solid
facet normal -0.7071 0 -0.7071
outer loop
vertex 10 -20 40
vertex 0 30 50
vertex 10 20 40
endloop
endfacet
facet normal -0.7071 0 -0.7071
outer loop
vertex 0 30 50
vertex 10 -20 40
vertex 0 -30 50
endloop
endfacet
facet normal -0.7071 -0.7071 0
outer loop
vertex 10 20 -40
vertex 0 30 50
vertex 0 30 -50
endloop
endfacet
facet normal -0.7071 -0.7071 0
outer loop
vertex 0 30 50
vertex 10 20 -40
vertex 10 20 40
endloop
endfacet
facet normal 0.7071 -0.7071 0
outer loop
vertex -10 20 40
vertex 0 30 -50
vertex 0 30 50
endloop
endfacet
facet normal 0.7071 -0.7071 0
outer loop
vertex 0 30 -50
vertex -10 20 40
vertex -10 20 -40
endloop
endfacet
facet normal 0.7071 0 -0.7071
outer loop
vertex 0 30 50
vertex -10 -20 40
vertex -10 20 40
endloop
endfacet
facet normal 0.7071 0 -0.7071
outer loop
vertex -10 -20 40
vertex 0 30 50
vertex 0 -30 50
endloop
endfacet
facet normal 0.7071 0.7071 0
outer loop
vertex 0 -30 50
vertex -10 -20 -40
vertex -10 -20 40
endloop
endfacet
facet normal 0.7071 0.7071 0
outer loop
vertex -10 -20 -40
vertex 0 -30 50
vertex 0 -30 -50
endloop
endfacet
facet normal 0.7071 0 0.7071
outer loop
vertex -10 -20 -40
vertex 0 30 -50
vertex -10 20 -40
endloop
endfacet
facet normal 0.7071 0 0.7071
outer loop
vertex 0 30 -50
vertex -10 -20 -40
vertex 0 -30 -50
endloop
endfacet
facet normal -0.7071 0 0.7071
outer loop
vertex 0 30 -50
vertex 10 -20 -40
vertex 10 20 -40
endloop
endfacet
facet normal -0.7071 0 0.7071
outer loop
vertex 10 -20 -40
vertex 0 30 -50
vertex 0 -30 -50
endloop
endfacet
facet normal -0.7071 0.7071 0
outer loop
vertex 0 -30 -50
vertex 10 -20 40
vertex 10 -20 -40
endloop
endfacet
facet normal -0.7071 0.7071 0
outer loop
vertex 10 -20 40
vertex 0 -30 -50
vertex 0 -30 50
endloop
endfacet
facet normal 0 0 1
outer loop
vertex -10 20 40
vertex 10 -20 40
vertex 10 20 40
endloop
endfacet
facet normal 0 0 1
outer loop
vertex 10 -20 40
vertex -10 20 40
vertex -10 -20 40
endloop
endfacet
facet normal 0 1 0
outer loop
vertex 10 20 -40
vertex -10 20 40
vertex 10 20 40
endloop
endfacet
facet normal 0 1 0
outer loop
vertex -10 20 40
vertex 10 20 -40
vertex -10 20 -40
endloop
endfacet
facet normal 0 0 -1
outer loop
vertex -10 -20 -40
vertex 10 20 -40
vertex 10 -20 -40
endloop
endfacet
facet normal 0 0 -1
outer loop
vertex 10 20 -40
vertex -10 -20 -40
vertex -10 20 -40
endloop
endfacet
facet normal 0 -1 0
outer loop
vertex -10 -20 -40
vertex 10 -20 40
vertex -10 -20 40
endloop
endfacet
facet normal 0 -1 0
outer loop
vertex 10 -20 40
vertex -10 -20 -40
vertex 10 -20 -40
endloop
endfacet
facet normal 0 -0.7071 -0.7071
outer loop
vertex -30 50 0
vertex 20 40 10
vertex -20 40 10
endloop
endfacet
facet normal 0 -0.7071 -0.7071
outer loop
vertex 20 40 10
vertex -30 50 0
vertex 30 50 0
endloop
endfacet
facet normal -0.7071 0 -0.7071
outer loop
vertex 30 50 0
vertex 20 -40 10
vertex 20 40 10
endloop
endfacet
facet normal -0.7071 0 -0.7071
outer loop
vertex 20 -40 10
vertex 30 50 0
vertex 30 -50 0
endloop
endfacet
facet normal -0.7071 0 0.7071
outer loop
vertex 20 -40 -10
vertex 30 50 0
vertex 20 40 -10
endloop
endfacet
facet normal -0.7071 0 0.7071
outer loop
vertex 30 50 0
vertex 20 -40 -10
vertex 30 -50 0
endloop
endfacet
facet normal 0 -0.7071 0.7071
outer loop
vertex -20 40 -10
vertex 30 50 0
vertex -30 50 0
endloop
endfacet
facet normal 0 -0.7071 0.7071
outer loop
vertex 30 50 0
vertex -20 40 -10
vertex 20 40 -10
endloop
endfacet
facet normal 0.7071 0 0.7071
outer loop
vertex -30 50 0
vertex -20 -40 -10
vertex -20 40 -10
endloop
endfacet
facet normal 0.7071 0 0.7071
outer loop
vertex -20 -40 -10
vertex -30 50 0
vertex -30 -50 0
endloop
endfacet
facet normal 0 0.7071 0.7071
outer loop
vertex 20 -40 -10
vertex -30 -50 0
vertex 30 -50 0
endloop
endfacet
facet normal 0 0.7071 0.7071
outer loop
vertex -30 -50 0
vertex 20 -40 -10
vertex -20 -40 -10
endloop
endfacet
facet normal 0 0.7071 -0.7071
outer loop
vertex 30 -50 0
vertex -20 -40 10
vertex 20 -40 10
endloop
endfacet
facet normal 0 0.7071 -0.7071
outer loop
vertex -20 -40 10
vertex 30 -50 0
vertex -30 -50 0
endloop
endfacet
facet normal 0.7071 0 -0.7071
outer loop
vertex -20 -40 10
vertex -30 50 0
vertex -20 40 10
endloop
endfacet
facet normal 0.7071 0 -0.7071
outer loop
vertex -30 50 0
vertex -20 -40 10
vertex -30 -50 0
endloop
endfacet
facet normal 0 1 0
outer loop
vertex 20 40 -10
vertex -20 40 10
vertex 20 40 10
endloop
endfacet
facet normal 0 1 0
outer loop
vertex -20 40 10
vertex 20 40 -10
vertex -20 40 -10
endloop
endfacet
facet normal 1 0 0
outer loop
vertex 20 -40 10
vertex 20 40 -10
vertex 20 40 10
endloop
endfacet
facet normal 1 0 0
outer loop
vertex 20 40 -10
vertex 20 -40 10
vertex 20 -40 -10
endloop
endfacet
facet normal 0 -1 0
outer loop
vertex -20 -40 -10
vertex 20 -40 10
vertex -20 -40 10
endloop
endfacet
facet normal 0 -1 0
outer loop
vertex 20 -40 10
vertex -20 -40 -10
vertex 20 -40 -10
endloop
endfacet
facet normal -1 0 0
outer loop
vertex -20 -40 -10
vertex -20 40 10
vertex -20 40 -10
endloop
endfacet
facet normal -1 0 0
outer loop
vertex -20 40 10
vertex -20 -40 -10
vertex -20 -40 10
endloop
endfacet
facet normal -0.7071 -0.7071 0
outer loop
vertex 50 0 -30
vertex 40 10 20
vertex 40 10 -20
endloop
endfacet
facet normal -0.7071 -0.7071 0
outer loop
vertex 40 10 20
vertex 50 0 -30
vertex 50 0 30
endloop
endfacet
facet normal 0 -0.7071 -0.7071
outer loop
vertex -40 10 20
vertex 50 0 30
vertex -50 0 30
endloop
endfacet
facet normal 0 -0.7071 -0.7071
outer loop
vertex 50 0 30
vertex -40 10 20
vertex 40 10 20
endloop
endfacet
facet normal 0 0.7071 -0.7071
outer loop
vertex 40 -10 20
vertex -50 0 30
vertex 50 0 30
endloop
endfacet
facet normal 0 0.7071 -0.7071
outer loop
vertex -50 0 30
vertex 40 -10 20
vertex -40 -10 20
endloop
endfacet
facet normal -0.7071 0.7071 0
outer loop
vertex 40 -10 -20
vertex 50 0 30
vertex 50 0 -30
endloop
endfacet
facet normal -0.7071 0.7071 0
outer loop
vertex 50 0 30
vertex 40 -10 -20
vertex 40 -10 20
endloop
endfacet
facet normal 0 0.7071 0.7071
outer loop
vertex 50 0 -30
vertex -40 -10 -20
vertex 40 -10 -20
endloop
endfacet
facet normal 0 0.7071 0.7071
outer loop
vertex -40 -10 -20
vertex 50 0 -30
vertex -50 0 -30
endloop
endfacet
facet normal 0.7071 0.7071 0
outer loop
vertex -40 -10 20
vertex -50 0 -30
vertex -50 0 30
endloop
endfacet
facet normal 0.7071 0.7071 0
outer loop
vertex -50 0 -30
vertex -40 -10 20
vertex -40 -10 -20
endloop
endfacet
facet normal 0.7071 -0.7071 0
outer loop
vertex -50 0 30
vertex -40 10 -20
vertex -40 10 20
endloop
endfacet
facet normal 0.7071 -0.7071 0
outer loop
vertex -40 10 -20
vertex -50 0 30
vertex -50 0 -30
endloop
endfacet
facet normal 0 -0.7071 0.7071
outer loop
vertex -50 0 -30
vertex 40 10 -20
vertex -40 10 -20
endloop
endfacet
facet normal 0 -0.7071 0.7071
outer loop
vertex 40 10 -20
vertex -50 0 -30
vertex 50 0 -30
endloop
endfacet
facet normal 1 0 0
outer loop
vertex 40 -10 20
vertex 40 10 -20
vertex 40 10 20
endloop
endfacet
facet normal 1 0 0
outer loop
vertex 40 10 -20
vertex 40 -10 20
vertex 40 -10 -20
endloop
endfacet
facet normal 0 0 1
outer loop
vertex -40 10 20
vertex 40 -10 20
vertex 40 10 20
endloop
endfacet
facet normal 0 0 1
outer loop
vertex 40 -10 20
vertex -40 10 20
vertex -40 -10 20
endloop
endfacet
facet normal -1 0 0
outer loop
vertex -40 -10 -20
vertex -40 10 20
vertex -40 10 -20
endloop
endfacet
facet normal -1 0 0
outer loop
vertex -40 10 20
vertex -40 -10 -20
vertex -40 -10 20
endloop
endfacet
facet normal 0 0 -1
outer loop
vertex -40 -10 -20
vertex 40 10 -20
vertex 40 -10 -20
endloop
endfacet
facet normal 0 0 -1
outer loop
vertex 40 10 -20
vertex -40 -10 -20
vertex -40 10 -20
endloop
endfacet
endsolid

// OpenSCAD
// Borromean Rings
//   coords via: http://dmccooey.com/polyhedra/BorromeanRings.html
//
scaling_factor = 10;

vertices = [
  [ 0,  3,  5], [ 0,  3, -5], [ 0, -3,  5], [ 0, -3, -5], // 1
  [ 1,  2,  4], [ 1,  2, -4], [ 1, -2,  4], [ 1, -2, -4],
  [-1,  2,  4], [-1,  2, -4], [-1, -2,  4], [-1, -2, -4],
  [ 3,  5,  0], [ 3, -5,  0], [-3,  5,  0], [-3, -5,  0], // 2
  [ 2,  4,  1], [ 2, -4,  1], [-2,  4,  1], [-2, -4,  1],
  [ 2,  4, -1], [ 2, -4, -1], [-2,  4, -1], [-2, -4, -1],
  [ 5,  0,  3], [-5,  0,  3], [ 5,  0, -3], [-5,  0, -3], // 3
  [ 4,  1,  2], [-4,  1,  2], [ 4,  1, -2], [-4,  1, -2],
  [ 4, -1,  2], [-4, -1,  2], [ 4, -1, -2], [-4, -1, -2]
];

faces = [
  [ 0,  2,  6,  4], [ 0,  4,  5,  1], [ 0,  1,  9,  8], [ 0,  8, 10,  2],
  [ 3,  2, 10, 11], [ 3, 11,  9,  1], [ 3,  1,  5,  7], [ 3,  7,  6,  2],
  [ 4,  6, 10,  8], [ 4,  8,  9,  5], [ 7,  5,  9, 11], [ 7, 11, 10,  6],
  [12, 14, 18, 16], [12, 16, 17, 13], [12, 13, 21, 20], [12, 20, 22, 14],
  [15, 14, 22, 23], [15, 23, 21, 13], [15, 13, 17, 19], [15, 19, 18, 14],
  [16, 18, 22, 20], [16, 20, 21, 17], [19, 17, 21, 23], [19, 23, 22, 18],
  [24, 26, 30, 28], [24, 28, 29, 25], [24, 25, 33, 32], [24, 32, 34, 26],
  [27, 26, 34, 35], [27, 35, 33, 25], [27, 25, 29, 31], [27, 31, 30, 26],
  [28, 30, 34, 32], [28, 32, 33, 29], [31, 29, 33, 35], [31, 35, 34, 30]
];

scale(scaling_factor) {
  polyhedron(points=vertices, faces=faces, convexity=20);
};
